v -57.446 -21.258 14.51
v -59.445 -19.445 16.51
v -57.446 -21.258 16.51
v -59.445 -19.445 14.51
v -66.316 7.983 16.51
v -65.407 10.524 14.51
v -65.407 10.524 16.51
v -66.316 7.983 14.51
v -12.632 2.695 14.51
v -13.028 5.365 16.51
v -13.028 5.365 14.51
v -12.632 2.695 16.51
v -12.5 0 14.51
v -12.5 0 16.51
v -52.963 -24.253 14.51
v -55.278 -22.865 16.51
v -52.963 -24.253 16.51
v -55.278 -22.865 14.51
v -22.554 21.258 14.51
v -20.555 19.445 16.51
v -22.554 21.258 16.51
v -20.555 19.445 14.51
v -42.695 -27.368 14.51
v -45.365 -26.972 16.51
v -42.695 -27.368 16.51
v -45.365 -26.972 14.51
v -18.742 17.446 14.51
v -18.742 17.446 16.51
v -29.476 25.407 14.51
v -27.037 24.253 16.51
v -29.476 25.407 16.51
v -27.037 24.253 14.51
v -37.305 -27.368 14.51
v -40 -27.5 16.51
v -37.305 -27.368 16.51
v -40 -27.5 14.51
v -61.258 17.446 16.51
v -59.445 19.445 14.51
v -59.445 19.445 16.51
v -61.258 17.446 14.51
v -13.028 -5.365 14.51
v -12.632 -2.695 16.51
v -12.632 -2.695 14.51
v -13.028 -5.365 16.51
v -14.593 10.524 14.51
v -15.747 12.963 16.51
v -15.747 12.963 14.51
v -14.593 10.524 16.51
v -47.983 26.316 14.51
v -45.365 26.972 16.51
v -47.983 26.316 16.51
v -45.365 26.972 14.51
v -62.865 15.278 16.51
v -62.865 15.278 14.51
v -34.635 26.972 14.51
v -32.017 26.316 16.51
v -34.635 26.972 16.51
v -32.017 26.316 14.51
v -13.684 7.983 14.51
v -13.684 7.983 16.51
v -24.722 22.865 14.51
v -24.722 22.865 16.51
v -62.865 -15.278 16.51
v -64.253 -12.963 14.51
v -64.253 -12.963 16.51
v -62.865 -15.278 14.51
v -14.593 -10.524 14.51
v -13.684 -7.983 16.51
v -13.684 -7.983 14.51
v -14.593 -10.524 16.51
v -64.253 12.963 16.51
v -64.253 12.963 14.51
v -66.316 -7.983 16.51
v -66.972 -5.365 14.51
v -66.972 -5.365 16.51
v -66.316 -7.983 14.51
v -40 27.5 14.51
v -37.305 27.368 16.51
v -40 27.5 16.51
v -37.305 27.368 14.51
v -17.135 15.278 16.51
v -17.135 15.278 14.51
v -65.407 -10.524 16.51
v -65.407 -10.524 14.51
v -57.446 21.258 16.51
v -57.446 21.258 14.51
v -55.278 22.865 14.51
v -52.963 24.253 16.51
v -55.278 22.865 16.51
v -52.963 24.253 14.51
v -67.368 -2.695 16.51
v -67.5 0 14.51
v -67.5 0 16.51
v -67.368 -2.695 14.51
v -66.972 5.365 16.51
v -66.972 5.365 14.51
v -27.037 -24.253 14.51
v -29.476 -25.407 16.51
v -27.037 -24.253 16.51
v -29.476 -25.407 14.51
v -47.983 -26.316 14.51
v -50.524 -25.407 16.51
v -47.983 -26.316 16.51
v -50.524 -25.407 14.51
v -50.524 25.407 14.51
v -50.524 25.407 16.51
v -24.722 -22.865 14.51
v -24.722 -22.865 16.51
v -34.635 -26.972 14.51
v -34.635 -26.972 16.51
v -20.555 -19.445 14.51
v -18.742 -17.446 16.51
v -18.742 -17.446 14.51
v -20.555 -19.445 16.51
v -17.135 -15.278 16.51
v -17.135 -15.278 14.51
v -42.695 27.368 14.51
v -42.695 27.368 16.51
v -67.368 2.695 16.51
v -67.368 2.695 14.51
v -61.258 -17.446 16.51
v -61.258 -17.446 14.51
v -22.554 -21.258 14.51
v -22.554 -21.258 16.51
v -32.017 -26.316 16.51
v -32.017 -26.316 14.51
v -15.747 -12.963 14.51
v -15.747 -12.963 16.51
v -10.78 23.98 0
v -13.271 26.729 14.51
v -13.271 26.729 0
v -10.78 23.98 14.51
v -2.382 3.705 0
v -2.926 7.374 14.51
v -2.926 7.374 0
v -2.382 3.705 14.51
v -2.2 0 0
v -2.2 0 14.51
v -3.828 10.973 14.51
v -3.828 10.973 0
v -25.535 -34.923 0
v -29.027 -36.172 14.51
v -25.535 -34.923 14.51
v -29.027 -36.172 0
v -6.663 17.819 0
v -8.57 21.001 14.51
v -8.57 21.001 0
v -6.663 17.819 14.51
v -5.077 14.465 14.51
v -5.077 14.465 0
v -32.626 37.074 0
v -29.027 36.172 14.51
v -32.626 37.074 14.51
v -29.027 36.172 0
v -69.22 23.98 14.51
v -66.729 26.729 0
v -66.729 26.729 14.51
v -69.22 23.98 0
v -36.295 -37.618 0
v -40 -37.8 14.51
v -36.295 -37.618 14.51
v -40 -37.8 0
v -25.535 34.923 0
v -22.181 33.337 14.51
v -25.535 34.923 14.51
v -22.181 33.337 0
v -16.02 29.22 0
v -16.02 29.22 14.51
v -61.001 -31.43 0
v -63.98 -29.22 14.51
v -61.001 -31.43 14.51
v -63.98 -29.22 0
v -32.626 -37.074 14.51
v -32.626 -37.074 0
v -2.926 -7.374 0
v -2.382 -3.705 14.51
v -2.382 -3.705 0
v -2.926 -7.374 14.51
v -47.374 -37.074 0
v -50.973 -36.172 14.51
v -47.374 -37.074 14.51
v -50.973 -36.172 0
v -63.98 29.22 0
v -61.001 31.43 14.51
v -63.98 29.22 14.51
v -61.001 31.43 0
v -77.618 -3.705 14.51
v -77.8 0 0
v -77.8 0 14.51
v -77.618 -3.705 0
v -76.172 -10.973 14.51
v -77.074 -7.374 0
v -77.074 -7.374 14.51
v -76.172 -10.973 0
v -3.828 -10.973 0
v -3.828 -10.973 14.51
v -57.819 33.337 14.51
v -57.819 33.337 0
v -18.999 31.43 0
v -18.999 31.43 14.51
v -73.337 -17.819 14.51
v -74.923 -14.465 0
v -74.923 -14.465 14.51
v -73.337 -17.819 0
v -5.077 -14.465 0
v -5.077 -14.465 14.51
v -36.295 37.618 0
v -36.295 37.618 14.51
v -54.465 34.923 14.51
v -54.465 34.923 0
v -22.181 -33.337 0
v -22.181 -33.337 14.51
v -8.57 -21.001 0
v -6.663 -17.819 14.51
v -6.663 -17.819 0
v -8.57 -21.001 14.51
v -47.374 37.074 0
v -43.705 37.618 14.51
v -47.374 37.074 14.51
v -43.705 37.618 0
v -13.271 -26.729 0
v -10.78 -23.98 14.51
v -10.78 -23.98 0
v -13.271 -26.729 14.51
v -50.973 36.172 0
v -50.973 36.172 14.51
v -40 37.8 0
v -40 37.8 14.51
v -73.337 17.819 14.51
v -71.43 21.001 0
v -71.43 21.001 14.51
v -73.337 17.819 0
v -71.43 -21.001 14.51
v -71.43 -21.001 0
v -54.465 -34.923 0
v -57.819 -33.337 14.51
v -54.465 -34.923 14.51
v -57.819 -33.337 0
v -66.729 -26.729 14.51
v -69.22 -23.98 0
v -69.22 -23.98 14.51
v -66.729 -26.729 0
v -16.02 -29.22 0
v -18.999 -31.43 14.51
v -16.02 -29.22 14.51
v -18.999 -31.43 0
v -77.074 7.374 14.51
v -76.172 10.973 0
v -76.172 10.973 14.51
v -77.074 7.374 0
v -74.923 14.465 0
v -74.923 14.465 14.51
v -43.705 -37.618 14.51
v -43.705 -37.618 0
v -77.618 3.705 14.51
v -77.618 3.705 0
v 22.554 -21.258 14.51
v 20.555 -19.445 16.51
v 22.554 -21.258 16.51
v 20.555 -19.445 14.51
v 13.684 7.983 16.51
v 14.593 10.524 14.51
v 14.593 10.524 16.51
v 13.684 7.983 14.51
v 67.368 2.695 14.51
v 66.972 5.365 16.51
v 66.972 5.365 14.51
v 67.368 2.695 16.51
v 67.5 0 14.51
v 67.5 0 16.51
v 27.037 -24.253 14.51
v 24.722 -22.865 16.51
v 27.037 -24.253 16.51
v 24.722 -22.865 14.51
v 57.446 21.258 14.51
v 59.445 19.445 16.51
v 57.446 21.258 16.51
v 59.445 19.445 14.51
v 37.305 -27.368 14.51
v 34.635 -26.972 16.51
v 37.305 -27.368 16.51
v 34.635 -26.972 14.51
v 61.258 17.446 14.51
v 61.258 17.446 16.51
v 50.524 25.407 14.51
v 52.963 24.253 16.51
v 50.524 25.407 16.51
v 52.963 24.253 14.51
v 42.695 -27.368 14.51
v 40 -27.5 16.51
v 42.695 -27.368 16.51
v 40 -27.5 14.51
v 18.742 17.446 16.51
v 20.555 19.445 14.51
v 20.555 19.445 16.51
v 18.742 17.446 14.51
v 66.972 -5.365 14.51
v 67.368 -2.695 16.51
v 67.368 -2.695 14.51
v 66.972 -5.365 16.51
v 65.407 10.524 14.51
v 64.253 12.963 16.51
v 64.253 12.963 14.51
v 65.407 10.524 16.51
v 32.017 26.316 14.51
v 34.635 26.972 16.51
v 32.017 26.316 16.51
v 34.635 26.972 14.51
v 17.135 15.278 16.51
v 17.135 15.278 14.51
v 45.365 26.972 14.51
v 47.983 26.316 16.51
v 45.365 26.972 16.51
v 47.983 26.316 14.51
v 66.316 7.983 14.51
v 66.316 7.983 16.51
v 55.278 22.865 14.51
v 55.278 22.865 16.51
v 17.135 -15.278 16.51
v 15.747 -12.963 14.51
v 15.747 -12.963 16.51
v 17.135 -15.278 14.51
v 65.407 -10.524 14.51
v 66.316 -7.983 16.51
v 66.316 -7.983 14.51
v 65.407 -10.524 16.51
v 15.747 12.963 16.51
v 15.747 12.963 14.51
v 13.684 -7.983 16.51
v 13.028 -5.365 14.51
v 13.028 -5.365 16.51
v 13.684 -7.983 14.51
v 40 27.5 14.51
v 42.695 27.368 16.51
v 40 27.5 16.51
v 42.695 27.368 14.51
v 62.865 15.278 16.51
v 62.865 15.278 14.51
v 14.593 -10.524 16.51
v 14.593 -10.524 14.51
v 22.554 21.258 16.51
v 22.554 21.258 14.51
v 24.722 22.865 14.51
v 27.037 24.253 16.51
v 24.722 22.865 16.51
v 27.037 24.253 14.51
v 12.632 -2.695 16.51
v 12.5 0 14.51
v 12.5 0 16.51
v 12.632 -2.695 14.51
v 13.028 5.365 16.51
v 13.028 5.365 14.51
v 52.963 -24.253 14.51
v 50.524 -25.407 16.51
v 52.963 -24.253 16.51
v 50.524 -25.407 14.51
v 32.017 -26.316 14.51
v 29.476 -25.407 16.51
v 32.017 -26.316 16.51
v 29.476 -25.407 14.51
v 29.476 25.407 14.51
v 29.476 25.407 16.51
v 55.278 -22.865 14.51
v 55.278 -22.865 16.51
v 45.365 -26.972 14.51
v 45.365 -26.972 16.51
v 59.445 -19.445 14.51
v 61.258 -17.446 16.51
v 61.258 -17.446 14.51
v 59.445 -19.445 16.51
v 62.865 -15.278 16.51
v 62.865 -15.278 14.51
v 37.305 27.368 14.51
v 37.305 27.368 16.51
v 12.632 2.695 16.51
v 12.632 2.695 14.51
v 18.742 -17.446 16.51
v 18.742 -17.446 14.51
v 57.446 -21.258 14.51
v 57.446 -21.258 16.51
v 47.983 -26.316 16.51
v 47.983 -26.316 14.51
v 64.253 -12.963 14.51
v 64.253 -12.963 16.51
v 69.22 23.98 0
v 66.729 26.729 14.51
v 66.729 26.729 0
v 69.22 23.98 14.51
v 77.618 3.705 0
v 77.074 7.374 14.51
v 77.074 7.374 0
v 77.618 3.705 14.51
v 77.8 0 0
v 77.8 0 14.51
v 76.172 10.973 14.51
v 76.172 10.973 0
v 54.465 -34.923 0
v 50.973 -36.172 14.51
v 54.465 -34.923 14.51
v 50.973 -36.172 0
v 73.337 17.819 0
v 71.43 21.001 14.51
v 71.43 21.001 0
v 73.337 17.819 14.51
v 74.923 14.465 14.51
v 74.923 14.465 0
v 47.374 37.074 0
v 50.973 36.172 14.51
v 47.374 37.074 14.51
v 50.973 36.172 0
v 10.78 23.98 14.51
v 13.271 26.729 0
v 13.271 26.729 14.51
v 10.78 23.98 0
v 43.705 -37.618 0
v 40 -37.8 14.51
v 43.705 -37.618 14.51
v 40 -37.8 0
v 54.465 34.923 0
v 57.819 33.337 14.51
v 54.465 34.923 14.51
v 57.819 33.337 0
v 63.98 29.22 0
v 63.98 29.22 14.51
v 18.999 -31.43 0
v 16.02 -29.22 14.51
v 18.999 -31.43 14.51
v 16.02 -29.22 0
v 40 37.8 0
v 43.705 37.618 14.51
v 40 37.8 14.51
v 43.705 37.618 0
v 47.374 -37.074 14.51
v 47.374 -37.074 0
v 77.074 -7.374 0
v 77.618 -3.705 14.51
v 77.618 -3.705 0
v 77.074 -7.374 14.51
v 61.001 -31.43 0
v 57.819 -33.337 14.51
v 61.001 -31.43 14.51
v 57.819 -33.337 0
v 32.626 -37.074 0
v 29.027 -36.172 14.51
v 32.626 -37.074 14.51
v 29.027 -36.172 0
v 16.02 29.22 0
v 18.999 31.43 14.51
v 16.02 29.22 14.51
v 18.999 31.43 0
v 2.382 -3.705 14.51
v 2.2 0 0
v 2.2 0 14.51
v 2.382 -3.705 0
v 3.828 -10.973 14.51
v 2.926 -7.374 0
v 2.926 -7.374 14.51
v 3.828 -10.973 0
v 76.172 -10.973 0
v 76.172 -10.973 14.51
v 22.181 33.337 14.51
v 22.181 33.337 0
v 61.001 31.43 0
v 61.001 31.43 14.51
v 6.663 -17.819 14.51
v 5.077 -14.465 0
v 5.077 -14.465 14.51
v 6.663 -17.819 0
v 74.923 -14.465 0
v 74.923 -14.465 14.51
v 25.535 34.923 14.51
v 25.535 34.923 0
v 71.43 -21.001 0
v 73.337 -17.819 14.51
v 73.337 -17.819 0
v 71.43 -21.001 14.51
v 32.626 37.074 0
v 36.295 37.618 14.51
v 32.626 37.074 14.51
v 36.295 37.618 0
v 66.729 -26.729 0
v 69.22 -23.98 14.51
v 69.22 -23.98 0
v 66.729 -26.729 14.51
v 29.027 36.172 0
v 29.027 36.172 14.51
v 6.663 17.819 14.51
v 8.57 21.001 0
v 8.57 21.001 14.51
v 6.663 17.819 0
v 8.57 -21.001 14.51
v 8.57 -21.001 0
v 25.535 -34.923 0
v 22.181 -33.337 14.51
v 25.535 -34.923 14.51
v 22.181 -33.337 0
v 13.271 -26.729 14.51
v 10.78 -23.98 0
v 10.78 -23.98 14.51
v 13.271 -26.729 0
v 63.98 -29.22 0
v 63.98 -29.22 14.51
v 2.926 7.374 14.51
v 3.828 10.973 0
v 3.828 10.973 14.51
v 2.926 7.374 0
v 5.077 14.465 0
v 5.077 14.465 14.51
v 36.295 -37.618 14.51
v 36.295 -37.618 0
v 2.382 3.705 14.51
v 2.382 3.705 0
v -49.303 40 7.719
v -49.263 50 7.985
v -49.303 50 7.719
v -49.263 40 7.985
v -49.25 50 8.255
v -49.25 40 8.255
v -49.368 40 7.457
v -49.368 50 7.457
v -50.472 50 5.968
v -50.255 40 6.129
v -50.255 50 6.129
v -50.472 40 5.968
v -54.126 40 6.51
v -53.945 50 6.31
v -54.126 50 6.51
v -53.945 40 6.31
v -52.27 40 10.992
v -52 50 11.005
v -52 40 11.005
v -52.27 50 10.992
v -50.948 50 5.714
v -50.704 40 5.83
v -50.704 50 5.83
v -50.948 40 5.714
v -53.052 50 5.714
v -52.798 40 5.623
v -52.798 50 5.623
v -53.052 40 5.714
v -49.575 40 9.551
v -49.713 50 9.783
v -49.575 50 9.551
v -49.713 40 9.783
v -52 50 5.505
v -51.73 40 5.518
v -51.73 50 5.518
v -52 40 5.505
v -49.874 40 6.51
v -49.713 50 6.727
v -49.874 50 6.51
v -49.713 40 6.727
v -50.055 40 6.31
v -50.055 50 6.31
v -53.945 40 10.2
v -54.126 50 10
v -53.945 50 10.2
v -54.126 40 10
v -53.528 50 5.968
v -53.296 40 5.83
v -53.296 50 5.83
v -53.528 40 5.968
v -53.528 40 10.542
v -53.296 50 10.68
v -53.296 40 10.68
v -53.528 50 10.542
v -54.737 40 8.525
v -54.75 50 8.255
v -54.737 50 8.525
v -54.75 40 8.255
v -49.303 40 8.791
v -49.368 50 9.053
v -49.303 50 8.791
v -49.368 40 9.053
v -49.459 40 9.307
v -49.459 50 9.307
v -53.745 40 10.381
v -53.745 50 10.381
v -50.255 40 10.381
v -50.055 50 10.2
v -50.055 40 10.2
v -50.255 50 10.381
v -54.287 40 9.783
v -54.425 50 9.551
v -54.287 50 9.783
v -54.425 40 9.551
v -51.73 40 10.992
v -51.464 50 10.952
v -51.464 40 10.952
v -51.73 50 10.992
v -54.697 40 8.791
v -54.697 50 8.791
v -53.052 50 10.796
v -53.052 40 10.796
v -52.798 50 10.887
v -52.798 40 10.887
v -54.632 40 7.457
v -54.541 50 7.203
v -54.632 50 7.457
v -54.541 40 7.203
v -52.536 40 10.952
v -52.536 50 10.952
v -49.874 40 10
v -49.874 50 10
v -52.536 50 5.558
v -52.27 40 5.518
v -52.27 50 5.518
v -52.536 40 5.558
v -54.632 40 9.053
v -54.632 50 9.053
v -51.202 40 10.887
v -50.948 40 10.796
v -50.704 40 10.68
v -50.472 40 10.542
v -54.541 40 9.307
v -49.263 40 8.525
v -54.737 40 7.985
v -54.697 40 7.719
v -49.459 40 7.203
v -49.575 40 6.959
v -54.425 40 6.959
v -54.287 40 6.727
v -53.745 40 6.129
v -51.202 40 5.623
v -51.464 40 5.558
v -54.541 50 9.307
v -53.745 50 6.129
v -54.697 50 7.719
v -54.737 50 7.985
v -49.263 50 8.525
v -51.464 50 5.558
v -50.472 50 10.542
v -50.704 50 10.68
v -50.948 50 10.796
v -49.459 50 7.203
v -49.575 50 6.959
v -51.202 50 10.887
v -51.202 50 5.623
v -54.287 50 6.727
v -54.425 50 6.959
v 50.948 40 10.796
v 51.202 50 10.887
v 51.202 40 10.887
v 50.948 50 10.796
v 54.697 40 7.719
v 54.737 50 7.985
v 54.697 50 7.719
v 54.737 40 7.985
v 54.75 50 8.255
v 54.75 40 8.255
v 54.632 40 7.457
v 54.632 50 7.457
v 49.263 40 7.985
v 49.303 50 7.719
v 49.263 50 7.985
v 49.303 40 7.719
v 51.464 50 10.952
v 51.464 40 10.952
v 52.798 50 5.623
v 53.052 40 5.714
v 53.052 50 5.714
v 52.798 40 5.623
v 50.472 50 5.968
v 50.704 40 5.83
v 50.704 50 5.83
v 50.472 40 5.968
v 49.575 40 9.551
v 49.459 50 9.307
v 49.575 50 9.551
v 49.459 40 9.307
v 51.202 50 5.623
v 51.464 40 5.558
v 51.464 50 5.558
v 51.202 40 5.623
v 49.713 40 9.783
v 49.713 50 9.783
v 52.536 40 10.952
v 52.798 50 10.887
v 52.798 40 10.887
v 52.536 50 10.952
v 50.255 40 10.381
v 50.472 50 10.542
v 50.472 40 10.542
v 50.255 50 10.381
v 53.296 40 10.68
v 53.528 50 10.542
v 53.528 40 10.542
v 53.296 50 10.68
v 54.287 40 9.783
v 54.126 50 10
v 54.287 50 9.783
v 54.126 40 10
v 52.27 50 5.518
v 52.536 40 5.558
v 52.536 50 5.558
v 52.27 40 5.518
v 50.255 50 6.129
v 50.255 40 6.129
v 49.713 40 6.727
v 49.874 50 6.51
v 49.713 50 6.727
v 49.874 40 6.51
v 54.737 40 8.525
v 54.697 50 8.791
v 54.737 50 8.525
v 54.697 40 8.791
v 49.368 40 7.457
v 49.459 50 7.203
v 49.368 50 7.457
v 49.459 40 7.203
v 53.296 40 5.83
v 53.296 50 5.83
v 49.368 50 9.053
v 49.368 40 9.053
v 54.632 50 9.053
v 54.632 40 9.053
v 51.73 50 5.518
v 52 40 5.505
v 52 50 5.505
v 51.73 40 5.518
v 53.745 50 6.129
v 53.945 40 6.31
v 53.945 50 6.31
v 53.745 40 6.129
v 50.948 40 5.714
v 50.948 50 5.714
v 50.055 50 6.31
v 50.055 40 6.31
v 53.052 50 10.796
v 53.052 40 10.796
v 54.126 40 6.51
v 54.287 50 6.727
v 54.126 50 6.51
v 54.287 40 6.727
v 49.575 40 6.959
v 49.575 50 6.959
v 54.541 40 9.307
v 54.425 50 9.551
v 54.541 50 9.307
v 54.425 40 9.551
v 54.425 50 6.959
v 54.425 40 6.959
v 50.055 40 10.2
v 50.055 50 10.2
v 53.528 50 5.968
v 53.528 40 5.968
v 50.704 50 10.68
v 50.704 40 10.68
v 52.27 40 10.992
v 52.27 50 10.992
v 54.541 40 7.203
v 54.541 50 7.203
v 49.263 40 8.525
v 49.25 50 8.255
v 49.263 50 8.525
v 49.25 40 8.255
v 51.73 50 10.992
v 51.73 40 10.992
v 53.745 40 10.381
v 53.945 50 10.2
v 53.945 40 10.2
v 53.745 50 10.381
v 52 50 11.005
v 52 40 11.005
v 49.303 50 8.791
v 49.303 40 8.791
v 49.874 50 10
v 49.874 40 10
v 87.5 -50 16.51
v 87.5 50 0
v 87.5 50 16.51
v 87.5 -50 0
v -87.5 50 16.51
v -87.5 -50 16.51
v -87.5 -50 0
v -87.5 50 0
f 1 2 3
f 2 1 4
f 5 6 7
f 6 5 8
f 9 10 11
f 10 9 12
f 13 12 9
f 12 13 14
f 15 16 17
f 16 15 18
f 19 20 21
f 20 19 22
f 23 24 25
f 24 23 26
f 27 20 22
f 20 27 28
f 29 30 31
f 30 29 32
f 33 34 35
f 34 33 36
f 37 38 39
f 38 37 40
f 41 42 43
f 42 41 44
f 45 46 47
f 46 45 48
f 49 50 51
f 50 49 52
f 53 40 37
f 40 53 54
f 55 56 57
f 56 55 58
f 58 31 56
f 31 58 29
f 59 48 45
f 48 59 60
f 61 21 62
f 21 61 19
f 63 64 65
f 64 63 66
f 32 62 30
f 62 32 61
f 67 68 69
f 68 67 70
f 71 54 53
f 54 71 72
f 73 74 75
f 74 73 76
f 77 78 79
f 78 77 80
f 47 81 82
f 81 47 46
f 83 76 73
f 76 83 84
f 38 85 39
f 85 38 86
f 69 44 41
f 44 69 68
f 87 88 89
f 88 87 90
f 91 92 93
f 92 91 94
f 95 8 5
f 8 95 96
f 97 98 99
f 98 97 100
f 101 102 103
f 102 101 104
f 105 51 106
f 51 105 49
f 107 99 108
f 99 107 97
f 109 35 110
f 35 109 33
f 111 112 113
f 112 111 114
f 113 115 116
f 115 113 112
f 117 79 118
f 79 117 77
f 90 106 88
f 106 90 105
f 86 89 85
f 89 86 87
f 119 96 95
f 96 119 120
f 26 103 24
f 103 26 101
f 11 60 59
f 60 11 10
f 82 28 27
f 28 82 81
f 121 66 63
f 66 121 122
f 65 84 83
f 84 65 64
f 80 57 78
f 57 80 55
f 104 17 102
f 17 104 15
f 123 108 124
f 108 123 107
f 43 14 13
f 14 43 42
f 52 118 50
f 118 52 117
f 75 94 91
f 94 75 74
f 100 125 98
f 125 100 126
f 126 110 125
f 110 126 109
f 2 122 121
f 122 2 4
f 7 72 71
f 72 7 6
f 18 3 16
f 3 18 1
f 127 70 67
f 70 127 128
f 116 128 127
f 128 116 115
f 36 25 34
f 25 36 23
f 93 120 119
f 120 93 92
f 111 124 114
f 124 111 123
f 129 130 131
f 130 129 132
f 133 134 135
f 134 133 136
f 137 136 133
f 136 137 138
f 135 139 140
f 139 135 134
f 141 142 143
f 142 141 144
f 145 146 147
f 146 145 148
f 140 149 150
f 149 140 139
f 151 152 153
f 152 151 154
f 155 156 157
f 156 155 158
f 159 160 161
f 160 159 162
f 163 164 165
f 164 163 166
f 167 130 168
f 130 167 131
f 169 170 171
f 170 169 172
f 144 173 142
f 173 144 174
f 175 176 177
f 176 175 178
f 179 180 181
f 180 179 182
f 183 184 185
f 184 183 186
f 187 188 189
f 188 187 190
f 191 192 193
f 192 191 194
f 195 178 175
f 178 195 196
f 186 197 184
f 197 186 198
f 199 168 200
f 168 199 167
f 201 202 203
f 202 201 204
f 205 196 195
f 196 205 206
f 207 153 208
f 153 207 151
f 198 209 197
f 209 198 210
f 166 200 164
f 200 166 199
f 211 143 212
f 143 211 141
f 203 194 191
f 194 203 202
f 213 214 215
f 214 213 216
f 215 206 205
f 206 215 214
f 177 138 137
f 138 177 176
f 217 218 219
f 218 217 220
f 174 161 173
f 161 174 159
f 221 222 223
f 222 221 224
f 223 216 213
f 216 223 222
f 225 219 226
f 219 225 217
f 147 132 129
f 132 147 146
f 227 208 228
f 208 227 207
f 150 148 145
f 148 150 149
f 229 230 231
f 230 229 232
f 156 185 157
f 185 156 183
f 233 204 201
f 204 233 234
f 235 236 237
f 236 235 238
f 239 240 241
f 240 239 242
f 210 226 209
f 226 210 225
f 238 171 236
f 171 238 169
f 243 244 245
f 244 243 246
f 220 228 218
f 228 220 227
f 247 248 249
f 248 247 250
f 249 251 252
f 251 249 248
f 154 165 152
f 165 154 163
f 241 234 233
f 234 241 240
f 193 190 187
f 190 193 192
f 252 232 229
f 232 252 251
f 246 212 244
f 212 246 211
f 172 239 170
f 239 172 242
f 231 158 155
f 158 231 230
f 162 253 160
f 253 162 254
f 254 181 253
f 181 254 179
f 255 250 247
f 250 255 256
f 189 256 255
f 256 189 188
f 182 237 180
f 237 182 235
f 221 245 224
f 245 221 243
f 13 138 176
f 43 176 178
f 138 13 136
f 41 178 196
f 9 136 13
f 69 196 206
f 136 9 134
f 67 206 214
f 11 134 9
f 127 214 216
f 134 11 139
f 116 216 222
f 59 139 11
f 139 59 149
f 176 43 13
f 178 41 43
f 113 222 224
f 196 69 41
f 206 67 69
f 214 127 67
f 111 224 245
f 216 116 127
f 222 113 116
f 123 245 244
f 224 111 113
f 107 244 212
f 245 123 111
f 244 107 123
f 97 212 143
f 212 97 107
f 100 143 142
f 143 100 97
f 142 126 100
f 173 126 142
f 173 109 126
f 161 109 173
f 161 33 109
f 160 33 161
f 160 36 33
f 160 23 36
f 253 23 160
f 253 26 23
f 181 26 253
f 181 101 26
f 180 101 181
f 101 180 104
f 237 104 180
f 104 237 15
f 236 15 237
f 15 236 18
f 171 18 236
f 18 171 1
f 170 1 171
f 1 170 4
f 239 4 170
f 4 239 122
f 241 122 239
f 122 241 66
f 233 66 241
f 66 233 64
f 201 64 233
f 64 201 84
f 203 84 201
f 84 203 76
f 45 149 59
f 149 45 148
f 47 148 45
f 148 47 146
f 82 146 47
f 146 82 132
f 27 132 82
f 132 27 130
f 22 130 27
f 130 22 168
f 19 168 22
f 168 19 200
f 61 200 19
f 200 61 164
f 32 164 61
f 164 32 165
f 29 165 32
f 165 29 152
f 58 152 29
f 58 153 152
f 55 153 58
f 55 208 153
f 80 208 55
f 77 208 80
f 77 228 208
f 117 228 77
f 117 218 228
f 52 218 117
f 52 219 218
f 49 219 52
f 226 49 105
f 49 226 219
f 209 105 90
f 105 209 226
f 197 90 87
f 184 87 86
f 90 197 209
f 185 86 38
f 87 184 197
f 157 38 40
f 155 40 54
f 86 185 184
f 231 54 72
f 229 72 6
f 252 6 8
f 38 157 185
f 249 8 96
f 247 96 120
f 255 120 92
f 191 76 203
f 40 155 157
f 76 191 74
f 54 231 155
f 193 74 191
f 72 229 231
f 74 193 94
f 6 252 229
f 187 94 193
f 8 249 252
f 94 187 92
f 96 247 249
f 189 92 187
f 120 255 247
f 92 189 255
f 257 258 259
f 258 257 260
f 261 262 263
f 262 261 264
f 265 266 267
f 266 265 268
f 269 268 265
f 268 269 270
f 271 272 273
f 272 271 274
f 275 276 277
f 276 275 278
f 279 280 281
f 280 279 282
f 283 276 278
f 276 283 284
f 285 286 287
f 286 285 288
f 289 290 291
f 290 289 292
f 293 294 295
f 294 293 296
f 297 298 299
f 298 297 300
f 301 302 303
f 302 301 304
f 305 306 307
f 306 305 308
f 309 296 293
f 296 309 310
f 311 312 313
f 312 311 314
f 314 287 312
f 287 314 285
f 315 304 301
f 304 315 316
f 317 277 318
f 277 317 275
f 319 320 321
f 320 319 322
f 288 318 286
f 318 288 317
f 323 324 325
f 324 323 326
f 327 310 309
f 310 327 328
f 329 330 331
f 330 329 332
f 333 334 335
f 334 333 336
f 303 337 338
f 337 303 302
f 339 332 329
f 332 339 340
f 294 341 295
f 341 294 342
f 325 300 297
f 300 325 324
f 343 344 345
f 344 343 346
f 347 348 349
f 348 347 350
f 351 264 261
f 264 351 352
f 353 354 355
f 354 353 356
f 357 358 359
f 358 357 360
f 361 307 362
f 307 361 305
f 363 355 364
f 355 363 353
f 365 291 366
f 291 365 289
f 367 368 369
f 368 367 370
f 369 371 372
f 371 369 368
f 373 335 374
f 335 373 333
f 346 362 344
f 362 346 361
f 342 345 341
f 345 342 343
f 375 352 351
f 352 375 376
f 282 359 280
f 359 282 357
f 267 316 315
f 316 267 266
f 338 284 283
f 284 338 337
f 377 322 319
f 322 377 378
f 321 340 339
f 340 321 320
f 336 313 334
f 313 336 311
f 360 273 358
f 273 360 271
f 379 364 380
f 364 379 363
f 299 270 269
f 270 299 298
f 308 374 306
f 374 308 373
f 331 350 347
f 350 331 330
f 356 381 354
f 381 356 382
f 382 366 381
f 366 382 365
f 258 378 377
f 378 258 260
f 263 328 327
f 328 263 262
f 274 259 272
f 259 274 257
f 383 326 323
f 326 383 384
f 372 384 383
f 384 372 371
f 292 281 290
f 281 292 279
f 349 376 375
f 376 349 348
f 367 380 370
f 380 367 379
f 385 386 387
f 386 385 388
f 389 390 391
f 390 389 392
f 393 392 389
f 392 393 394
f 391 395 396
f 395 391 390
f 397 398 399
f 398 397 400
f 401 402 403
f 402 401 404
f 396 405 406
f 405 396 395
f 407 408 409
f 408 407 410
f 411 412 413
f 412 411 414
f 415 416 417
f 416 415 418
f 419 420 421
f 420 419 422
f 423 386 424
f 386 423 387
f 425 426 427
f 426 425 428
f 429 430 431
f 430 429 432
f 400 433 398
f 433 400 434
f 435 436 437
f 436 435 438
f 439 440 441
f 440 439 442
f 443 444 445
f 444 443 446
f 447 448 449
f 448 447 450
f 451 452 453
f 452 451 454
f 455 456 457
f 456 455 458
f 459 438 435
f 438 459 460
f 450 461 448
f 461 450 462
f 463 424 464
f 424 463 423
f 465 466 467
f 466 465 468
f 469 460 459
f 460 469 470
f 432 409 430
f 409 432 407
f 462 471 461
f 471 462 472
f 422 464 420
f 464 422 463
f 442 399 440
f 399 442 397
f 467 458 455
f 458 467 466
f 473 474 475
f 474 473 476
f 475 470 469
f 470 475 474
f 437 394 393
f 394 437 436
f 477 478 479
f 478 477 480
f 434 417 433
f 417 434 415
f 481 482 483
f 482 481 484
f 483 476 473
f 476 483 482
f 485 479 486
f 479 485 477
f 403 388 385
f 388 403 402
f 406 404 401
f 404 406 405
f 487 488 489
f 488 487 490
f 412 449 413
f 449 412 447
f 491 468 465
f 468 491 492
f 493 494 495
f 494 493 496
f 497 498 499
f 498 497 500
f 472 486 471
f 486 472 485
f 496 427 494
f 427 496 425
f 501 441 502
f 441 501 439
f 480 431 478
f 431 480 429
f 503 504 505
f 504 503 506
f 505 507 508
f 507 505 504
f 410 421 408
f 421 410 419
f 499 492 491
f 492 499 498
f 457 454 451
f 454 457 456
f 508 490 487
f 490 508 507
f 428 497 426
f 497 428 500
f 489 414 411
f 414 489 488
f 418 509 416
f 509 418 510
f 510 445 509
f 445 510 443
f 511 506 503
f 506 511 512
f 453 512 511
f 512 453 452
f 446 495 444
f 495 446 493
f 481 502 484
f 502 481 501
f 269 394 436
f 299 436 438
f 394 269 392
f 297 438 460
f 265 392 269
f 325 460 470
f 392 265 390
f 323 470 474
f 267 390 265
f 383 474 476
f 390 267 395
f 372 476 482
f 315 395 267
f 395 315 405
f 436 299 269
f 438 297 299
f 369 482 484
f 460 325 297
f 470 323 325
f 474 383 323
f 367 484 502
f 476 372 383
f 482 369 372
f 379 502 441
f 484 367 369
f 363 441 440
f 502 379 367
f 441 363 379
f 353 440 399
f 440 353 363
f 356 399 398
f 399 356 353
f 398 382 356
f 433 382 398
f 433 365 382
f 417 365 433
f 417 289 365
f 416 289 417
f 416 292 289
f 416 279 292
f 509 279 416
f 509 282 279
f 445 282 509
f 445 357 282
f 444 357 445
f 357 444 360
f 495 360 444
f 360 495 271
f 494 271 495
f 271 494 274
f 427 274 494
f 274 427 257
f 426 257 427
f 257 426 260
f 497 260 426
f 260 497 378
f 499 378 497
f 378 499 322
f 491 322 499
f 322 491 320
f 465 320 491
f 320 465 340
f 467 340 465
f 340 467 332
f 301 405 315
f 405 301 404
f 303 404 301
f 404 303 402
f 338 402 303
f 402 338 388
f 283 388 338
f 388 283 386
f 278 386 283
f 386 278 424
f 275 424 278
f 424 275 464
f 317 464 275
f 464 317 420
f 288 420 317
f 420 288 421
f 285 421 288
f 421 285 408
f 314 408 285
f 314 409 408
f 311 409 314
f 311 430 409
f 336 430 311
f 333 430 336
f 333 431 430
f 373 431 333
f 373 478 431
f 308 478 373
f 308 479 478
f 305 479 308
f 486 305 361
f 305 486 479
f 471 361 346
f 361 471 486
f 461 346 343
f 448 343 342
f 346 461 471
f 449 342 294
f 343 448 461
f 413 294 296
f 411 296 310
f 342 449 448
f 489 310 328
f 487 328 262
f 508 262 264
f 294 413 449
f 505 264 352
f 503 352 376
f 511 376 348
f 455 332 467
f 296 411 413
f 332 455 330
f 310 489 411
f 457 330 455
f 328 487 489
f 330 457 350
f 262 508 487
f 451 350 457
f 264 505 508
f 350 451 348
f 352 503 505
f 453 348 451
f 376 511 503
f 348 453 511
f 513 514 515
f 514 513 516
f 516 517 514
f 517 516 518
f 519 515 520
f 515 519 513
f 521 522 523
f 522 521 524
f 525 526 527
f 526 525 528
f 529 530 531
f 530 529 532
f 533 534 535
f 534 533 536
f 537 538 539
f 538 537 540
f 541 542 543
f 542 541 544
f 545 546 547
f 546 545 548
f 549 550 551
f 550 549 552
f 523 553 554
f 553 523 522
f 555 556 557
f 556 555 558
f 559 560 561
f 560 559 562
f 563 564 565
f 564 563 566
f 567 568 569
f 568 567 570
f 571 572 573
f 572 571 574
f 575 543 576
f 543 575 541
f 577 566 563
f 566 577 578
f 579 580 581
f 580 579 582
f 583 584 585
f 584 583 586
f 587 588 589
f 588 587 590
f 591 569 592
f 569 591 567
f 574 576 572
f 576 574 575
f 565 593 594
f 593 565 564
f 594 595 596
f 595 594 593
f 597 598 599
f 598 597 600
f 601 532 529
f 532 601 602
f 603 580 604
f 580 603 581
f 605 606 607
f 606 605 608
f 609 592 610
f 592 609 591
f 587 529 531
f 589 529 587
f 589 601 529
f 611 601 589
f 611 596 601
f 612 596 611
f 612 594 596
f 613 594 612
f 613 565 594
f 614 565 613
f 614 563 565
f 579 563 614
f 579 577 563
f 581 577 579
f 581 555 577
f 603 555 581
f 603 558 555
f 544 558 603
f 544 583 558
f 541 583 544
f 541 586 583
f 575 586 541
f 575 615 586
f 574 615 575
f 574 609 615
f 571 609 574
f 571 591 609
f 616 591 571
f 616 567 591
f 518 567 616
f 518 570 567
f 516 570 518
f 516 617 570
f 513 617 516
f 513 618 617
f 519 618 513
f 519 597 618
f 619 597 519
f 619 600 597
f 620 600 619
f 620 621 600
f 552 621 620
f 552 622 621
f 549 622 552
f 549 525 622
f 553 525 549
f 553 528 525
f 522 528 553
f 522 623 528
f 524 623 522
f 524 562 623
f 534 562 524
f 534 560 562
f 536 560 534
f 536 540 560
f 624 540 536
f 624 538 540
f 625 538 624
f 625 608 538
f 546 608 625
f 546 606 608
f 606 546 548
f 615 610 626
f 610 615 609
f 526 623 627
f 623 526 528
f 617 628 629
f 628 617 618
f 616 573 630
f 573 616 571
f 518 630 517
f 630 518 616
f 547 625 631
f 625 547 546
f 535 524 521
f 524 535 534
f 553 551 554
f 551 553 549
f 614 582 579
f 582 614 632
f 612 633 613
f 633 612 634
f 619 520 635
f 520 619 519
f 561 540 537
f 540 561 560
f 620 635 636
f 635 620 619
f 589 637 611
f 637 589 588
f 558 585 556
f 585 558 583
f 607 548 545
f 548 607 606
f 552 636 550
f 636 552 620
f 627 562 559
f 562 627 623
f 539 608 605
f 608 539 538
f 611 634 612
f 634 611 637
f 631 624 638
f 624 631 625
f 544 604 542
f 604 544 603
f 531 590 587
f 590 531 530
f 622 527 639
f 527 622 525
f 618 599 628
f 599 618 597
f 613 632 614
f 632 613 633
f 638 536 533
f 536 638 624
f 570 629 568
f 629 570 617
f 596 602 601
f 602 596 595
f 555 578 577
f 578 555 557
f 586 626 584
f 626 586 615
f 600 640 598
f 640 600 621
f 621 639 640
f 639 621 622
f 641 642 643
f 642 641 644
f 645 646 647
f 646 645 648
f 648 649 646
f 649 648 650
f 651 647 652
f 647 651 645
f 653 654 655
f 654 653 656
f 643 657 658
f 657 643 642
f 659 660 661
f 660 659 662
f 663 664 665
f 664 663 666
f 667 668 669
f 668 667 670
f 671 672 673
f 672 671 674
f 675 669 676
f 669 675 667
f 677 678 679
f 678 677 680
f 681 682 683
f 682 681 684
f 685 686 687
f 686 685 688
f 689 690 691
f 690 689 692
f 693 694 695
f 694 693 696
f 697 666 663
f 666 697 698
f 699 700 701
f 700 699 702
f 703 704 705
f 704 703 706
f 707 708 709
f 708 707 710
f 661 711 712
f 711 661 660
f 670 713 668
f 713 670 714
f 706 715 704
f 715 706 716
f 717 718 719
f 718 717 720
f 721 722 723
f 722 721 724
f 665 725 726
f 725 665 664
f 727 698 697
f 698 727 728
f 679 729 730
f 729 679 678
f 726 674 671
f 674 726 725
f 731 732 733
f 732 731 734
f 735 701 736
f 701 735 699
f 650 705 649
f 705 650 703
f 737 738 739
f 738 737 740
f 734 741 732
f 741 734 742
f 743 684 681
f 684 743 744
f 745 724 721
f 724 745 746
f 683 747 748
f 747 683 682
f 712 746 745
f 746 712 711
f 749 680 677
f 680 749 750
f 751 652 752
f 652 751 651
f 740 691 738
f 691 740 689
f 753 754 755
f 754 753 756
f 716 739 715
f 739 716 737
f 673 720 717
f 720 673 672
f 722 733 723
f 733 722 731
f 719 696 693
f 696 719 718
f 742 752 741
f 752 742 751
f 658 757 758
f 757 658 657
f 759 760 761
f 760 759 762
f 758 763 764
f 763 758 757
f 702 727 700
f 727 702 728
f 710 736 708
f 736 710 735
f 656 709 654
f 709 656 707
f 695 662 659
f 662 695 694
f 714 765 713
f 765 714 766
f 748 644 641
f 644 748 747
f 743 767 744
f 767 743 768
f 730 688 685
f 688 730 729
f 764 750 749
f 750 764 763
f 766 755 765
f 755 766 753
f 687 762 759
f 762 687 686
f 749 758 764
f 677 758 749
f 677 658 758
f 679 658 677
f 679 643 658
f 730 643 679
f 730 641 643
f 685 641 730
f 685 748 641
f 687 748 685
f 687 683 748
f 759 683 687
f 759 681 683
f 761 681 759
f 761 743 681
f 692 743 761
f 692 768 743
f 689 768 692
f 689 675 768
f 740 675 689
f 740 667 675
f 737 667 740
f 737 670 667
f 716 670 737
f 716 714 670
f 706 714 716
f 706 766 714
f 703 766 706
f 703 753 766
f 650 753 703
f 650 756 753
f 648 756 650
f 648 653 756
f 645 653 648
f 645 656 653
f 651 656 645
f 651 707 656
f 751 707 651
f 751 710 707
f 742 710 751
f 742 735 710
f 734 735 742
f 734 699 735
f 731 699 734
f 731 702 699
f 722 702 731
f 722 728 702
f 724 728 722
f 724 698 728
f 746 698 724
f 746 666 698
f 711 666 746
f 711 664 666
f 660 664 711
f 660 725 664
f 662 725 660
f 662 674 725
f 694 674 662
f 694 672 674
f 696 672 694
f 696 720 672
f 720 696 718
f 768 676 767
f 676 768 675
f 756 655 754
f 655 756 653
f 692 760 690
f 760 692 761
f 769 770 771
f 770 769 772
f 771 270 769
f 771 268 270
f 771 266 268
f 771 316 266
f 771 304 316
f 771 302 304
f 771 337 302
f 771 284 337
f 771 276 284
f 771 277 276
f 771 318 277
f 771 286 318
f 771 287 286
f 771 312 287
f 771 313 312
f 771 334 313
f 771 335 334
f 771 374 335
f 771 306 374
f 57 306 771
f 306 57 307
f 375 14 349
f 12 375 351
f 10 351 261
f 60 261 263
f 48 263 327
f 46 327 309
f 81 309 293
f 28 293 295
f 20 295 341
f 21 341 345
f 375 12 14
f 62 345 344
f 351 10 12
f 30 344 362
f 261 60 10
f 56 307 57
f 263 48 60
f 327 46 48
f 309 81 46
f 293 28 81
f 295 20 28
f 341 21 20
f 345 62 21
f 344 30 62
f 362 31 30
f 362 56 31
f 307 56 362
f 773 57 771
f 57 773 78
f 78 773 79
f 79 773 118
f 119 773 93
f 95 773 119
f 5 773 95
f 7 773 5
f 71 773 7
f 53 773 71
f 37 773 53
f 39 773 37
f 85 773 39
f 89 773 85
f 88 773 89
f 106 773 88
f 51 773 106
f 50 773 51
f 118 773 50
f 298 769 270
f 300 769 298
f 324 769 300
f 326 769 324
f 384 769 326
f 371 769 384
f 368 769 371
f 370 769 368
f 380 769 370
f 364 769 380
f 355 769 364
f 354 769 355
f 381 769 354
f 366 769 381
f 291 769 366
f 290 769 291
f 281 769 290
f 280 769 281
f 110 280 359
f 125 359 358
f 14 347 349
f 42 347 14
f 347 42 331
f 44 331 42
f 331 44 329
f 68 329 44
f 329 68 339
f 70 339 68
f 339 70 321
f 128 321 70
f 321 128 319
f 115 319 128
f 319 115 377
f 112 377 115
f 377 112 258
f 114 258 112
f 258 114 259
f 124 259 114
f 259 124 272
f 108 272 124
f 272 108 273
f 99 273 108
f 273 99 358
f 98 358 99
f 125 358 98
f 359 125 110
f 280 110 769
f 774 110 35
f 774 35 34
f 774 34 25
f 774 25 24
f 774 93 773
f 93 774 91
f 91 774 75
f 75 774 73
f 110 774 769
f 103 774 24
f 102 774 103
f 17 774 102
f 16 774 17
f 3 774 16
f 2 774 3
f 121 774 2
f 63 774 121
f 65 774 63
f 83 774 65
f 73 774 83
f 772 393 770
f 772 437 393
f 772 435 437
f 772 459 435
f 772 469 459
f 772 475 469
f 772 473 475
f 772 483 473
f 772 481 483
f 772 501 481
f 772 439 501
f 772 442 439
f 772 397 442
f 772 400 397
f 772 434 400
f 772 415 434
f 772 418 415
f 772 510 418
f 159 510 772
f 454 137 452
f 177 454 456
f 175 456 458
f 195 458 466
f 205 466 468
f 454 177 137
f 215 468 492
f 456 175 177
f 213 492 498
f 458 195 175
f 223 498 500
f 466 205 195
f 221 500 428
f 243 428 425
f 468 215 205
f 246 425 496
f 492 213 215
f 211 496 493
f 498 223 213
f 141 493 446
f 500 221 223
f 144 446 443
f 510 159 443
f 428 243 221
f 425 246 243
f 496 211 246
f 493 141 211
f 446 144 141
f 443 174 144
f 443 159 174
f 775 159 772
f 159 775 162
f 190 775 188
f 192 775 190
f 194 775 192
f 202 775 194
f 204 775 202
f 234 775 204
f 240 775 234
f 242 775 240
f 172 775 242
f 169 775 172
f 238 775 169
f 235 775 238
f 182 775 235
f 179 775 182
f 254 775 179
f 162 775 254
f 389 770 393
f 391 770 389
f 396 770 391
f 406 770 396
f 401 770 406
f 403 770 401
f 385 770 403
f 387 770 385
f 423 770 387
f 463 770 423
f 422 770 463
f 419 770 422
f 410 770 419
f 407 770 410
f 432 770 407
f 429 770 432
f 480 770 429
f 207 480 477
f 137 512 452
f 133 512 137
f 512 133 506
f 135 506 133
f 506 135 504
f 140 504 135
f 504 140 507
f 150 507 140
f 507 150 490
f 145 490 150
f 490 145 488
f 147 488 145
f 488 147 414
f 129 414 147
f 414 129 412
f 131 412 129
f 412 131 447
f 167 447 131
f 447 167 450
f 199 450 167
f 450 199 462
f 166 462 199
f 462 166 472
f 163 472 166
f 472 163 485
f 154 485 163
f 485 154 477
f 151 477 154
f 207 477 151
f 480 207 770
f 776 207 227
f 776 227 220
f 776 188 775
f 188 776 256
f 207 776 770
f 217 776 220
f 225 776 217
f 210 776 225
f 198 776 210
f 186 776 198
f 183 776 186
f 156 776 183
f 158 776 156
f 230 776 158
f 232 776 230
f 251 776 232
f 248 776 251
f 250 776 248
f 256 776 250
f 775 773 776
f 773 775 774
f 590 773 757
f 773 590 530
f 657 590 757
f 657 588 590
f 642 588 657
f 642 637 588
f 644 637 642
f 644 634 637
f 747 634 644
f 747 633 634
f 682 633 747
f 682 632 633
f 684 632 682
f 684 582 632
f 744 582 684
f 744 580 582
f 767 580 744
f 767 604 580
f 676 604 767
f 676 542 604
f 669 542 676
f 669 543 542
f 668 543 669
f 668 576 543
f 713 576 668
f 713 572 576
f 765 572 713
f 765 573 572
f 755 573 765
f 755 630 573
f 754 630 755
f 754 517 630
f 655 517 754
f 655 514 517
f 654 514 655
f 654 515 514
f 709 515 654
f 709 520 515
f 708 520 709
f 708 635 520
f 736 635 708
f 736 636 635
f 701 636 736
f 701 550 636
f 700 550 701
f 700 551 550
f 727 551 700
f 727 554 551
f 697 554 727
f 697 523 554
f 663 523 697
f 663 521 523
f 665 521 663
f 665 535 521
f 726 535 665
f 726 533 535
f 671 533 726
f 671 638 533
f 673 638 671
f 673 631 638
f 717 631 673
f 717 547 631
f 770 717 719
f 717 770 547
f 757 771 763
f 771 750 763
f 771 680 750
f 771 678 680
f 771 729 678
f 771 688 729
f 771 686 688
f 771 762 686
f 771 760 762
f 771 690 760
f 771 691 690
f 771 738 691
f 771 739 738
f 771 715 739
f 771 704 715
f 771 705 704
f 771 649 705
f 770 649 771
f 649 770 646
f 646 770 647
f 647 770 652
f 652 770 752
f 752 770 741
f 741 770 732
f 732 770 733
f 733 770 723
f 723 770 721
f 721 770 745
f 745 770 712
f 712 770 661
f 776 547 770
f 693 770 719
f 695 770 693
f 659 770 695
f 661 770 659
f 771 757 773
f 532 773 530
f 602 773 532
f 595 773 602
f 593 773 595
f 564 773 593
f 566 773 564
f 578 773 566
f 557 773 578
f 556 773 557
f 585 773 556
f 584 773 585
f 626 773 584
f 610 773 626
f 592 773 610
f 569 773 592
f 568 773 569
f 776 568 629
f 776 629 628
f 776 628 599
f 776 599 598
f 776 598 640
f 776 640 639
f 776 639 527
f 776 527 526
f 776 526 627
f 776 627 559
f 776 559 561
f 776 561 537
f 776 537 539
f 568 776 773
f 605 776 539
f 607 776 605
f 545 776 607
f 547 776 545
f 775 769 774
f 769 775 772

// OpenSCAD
// =====================================================================
//  Firebird Twin Gauge Pod — minimum viable v1
//  Clean restart. Get the holes and dimensions right; aesthetics later.
//
//  What's in this version:
//    - Solid rectangular pod body
//    - 2 round bezel openings (Ø55) cut into the front face
//    - 2 round PCB pockets (Ø75.6) directly behind the bezels,
//      going all the way through the back face (PCB drops in from
//      behind, cables exit through the pocket opening)
//    - 4 M2 self-tap pilot holes per display at the trapezoidal
//      standoff positions, hidden 2 mm behind the front face
//    - 2 placeholder pod-to-dash mounting holes on the top edge
//
//  What's NOT in this version (will add later):
//    - Rounded outer edges
//    - Chamfered cosmetic trim ring around each bezel
//    - Hollow internal cavity (saves print weight)
//    - Cable exit slot
//    - Mounting flange with countersunk dash holes
//
//  Print orientation:
//    Back face on the build plate (z=0), fascia points up.
//    The bezel openings on top print clean (no overhangs needed).
//    The PCB pockets print as straight cylindrical walls upward,
//    also clean. The pilot holes print as small blind holes from
//    the back of the fascia toward the front — also fine.
//
//  All dimensions in mm.
// =====================================================================

// ---------- DISPLAY MODULE (Waveshare ESP32-S3-Touch-LCD-2.1) ----------
DISPLAY_PCB_OD     = 75.0;     // round PCB outer diameter (wiki)
DISPLAY_PCB_T      = 1.6;      // PCB thickness
DISPLAY_BACK_DEPTH = 8.91;     // tallest rear component (calipered)
BEZEL_OPENING      = 55.0;     // visible round opening through fascia
PCB_POCKET_OS      = 0.6;      // pocket oversize: Ø75.6 pocket vs Ø75 PCB
                               // = 0.3 mm clearance per side. Snug press-fit
                               // intentionally. PCB held in place by friction
                               // plus a bead of hot glue or VHB tape.

// ---------- POD OVERALL ----------
POD_W           = 175;         // < 215.9 envelope, leaves margin
POD_H           = 100;         // < 106.4 envelope, leaves margin
FASCIA_T        = 2;         // depth of bezel cut into the fascia
DISPLAY_SPACING = 80;          // bezel center-to-center (was 105 — closer)

// Pod depth = fascia + PCB + back-of-PCB clearance + a little extra
POD_DEPTH = FASCIA_T + DISPLAY_PCB_T + DISPLAY_BACK_DEPTH + 4;  // ~19

// ---------- POD-TO-DASH MOUNTING ----------
// Two blind holes on the TOP face of the pod. Screws come down from
// the dash side and thread into these holes (use heat-set M5 inserts,
// or self-tap with Ø ~4.2 hole instead of Ø 5.5 if you prefer).
SCREW_HOLE_D     = 5.5;        // for M5 clearance / heat-set insert
SCREW_HOLE_DEPTH = 10;         // depth down from top face
SCREW_SPACING    = 104;        // o.c. (calipered on dash)
SCREW_Z_OFFSET   = POD_DEPTH/2; // depth-wise, midway through the depth

// ---------- RENDER QUALITY ----------
$fn = 64;
EPS = 0.05;

// =====================================================================
// BUILD
// =====================================================================
//   Coordinate frame:
//     X+ = passenger side, Y+ = up (toward dash), Z+ = forward (cabin)
//     Pod centered at origin in X and Y.
//     Z=0 is the back face (touching dash undercut after install).
//     Z=POD_DEPTH is the front face (fascia, facing driver).

difference() {
    // 1. Outer rectangular pod body
    translate([-POD_W/2, -POD_H/2, 0])
        cube([POD_W, POD_H, POD_DEPTH]);

    // 2. Per-display cuts: bezel + PCB pocket only.
    //    PCB retention is friction-fit + adhesive; no pilot holes in v1.
    for (xs = [-1, 1]) {
        translate([xs * DISPLAY_SPACING/2, 0, 0]) {

            // Bezel: Ø55 cut from front face inward, FASCIA_T deep
            translate([0, 0, POD_DEPTH - FASCIA_T - EPS])
                cylinder(d = BEZEL_OPENING,
                         h = FASCIA_T + 2*EPS);

            // PCB pocket: Ø75.6 from the back face up to the back of
            // the fascia. PCB inserts from the back; cables route out
            // through the same opening. The PCB rests on the bezel
            // shoulder (annular ring between Ø55 and Ø75.6 at z=POD_DEPTH-FASCIA_T).
            translate([0, 0, -EPS])
                cylinder(d = DISPLAY_PCB_OD + PCB_POCKET_OS,
                         h = POD_DEPTH - FASCIA_T + EPS);
        }
    }

    // 3. Pod-to-dash screw holes — two blind holes on the TOP face,
    //    going down SCREW_HOLE_DEPTH mm. 104 mm o.c. in X, midway
    //    through the depth in Z.
    for (xs = [-1, 1])
        translate([xs * SCREW_SPACING/2,
                   POD_H/2 - SCREW_HOLE_DEPTH,
                   SCREW_Z_OFFSET])
            rotate([-90, 0, 0])
                cylinder(d = SCREW_HOLE_D,
                         h = SCREW_HOLE_DEPTH + EPS);
}
